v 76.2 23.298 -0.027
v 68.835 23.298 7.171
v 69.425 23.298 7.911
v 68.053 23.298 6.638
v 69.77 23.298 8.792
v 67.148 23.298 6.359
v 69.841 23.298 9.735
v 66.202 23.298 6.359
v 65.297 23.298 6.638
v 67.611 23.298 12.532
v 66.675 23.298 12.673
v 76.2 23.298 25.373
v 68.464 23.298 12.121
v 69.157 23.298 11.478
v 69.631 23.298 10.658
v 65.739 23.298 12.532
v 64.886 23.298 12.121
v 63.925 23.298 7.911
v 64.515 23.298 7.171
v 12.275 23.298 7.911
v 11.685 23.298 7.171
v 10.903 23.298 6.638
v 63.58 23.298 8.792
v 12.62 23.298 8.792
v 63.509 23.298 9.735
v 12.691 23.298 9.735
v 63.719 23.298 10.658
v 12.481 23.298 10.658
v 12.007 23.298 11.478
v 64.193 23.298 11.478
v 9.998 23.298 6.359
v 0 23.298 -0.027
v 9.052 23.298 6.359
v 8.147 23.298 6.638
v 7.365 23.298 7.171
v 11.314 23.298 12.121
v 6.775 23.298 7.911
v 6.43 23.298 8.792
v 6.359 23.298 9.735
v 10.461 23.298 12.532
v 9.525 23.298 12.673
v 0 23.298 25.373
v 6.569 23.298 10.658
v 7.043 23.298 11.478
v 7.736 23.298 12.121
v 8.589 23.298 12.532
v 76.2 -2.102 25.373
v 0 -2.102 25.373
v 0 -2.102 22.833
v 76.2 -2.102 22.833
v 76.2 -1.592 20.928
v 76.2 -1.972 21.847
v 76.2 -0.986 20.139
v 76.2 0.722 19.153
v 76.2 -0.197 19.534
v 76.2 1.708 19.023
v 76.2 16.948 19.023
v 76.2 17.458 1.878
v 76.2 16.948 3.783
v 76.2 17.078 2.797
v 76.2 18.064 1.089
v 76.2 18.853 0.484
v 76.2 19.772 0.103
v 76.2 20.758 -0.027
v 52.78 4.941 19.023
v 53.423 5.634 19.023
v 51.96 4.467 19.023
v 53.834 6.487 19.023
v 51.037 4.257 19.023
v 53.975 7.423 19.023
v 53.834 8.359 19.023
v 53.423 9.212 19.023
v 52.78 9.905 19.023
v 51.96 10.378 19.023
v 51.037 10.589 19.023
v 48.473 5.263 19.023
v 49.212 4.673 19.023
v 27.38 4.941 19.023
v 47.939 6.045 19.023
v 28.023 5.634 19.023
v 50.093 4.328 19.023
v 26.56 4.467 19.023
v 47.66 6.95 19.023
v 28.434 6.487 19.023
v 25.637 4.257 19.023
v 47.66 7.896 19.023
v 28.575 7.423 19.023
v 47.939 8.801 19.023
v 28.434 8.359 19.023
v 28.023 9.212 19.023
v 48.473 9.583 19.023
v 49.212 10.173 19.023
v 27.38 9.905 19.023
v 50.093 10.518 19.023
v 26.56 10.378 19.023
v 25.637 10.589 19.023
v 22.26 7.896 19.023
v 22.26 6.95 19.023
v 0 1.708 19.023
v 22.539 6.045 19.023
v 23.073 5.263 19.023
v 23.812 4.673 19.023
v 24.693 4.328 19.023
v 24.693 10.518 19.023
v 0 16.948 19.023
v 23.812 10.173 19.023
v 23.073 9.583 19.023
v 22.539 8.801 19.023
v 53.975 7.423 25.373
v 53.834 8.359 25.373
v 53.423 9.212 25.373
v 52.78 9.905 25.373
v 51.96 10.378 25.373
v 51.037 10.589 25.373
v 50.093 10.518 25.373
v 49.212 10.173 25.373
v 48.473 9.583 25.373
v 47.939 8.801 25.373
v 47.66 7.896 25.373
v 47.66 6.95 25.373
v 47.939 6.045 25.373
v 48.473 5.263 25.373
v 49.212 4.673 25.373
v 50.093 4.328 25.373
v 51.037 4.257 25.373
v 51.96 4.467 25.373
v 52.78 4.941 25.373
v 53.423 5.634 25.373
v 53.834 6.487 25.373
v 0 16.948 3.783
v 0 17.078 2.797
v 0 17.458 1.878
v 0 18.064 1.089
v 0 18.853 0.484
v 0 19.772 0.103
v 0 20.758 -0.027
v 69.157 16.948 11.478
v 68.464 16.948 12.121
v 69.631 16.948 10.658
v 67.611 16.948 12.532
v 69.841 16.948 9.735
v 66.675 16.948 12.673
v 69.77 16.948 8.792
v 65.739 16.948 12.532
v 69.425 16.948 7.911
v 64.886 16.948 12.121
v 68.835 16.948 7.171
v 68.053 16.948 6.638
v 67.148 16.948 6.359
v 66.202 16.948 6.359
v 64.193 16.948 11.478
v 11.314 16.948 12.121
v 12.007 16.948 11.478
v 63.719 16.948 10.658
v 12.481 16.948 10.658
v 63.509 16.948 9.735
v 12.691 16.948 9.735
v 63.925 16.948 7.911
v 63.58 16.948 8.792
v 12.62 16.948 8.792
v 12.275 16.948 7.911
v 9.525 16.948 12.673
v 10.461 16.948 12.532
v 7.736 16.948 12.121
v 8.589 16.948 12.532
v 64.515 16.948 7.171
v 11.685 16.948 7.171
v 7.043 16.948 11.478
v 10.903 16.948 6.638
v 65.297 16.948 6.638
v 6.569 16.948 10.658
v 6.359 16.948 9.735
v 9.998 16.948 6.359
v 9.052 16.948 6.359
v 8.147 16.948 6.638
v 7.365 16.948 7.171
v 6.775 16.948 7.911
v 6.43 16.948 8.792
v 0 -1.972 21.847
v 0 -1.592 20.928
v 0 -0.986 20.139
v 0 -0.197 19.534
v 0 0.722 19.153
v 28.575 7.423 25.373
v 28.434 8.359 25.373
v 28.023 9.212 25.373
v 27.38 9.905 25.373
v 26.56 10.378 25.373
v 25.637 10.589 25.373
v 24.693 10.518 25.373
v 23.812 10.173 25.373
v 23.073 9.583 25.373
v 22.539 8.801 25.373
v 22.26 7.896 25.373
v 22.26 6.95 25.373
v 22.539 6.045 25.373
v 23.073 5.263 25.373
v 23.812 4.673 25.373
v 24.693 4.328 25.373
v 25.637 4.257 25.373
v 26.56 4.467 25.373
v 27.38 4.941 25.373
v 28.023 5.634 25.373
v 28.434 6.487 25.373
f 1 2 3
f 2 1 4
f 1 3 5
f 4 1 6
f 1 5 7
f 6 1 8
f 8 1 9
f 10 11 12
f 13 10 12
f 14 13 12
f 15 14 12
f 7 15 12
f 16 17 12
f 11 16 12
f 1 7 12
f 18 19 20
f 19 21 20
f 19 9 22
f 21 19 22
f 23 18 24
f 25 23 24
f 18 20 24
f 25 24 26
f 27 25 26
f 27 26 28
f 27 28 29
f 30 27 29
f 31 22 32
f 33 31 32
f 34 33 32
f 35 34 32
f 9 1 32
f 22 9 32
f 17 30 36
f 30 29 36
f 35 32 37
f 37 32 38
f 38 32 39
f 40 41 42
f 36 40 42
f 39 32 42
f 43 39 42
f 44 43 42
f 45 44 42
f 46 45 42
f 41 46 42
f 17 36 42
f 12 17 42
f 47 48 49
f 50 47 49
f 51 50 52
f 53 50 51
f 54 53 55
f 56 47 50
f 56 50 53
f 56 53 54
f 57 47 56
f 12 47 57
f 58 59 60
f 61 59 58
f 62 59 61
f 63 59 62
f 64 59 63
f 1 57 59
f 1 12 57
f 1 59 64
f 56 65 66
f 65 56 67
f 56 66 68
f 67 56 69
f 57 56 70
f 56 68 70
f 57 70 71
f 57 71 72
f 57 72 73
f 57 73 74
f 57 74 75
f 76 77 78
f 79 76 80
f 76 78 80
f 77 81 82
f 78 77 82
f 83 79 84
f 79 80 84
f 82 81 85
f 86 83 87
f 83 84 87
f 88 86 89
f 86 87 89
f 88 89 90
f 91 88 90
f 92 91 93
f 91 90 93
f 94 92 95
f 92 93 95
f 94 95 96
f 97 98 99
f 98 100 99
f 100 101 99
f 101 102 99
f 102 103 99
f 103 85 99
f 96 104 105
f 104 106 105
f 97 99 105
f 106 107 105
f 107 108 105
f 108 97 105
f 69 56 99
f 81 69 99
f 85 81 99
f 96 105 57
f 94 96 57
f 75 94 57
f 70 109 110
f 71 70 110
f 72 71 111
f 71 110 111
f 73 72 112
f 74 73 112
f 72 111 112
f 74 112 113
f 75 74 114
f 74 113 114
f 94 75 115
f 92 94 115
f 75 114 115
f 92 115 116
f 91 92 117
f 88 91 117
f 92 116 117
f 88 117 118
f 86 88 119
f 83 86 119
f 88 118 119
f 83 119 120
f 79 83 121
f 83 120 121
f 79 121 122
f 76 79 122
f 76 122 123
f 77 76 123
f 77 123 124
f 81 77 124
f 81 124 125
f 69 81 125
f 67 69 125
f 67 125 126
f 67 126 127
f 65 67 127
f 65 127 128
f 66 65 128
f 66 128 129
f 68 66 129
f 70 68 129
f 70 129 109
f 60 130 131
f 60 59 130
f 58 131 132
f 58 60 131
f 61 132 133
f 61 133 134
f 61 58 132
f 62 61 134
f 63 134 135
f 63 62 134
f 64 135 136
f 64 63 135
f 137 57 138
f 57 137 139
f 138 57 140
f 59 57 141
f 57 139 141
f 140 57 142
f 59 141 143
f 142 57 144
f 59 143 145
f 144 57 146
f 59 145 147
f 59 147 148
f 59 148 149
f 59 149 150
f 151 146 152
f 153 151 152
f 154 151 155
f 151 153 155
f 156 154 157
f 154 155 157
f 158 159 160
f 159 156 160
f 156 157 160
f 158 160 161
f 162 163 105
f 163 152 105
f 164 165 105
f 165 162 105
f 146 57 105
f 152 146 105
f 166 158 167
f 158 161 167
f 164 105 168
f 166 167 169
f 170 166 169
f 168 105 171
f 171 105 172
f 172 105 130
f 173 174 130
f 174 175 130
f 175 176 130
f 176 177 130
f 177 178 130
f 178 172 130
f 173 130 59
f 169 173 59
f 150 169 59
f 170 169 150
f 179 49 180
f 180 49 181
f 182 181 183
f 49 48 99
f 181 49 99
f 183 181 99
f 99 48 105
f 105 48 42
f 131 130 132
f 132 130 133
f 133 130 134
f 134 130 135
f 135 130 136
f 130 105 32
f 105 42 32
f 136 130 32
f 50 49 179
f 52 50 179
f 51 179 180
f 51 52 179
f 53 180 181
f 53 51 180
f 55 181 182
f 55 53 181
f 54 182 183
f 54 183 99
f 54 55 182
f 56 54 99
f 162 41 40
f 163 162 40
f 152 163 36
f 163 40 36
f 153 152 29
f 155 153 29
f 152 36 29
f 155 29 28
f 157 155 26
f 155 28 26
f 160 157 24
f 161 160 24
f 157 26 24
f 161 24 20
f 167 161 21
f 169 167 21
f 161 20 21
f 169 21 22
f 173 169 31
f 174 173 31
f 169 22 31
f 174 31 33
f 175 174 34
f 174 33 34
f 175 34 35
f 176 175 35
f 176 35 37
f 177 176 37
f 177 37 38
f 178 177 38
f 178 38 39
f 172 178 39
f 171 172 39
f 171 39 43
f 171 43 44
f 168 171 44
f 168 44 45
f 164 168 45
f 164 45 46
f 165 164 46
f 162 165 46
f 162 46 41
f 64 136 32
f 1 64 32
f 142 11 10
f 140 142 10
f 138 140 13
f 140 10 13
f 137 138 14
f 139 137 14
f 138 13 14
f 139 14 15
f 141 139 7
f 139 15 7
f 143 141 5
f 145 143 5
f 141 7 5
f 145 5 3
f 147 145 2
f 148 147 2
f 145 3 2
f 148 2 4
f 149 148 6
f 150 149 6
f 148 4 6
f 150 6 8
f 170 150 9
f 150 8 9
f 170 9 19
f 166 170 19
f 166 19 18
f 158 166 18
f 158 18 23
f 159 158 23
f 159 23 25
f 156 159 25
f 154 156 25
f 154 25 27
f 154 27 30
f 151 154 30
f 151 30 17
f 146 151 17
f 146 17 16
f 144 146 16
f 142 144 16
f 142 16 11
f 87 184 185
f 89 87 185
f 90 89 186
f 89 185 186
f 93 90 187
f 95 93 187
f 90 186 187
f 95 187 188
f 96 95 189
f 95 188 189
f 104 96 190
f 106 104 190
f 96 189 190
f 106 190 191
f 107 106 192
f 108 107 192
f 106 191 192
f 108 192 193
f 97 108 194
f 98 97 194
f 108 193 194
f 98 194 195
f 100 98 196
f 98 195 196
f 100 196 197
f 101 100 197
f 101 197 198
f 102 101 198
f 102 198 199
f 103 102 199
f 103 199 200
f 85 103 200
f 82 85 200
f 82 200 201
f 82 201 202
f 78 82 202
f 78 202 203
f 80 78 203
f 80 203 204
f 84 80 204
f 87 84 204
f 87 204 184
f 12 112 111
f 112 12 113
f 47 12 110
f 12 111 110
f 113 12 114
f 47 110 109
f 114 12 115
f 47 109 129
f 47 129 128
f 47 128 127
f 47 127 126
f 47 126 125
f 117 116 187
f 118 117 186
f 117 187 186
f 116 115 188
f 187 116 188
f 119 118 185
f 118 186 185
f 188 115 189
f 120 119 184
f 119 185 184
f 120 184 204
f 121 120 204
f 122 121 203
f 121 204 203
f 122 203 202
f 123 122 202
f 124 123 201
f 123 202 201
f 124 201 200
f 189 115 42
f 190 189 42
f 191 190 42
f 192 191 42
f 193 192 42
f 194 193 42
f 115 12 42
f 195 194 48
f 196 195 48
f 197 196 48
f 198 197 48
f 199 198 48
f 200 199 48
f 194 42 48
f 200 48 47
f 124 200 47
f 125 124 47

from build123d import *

# Parameters (mm, degrees)
BOSS_EXTRUDE1_DEPTH = 76.2
FILLET2_R           = 3.81
SKETCH2_R           = 3.175
CUT_EXTRUDE1_DEPTH  = 76.2
SKETCH3_R           = 3.175
CUT_EXTRUDE2_DEPTH  = 76.2


with BuildPart() as part:
    # Sketch1 → Boss-Extrude1 (new body)
    with BuildSketch(Plane(origin=(0, 0, 0), x_dir=(0, 0, -1), z_dir=(1, 0, 0))):
        Polygon((0.026896594, 23.297964889), (-25.373103406, 23.297964889), (-25.373103406, -2.102035111), (-19.023103406, -2.102035111), (-19.023103406, 16.947964889), (0.026896594, 16.947964889), align=None)
    extrude(amount=BOSS_EXTRUDE1_DEPTH)

    # Fillet2
    fillet2_edges = [part.edges().sort_by_distance(p)[0] for p in [
        (38.1, 16.947964889, -0.026896594),
        (38.1, -2.102035111, 19.023103406),
    ]]
    fillet(fillet2_edges, radius=FILLET2_R)

    # Sketch2 → Cut-Extrude1 (cut)
    with BuildSketch(Plane(origin=(0, 23.297964889, 0), x_dir=(1, 0, 0), z_dir=(0, 1, 0))):
        with Locations(Location((9.525, -9.498103406, 0), (0, 0, 270))):
            Circle(SKETCH2_R)
        with Locations(Location((66.675, -9.498103406, 0), (0, 0, 270))):
            Circle(SKETCH2_R)
    extrude(amount=-CUT_EXTRUDE1_DEPTH, mode=Mode.SUBTRACT)

    # Sketch3 → Cut-Extrude2 (cut)
    with BuildSketch(Plane.XY.offset(25.373103406)):
        with Locations((25.4, 7.422964889)):
            Circle(SKETCH3_R)
        with Locations((50.8, 7.422964889)):
            Circle(SKETCH3_R)
    extrude(amount=-CUT_EXTRUDE2_DEPTH, mode=Mode.SUBTRACT)


solid = part.part
